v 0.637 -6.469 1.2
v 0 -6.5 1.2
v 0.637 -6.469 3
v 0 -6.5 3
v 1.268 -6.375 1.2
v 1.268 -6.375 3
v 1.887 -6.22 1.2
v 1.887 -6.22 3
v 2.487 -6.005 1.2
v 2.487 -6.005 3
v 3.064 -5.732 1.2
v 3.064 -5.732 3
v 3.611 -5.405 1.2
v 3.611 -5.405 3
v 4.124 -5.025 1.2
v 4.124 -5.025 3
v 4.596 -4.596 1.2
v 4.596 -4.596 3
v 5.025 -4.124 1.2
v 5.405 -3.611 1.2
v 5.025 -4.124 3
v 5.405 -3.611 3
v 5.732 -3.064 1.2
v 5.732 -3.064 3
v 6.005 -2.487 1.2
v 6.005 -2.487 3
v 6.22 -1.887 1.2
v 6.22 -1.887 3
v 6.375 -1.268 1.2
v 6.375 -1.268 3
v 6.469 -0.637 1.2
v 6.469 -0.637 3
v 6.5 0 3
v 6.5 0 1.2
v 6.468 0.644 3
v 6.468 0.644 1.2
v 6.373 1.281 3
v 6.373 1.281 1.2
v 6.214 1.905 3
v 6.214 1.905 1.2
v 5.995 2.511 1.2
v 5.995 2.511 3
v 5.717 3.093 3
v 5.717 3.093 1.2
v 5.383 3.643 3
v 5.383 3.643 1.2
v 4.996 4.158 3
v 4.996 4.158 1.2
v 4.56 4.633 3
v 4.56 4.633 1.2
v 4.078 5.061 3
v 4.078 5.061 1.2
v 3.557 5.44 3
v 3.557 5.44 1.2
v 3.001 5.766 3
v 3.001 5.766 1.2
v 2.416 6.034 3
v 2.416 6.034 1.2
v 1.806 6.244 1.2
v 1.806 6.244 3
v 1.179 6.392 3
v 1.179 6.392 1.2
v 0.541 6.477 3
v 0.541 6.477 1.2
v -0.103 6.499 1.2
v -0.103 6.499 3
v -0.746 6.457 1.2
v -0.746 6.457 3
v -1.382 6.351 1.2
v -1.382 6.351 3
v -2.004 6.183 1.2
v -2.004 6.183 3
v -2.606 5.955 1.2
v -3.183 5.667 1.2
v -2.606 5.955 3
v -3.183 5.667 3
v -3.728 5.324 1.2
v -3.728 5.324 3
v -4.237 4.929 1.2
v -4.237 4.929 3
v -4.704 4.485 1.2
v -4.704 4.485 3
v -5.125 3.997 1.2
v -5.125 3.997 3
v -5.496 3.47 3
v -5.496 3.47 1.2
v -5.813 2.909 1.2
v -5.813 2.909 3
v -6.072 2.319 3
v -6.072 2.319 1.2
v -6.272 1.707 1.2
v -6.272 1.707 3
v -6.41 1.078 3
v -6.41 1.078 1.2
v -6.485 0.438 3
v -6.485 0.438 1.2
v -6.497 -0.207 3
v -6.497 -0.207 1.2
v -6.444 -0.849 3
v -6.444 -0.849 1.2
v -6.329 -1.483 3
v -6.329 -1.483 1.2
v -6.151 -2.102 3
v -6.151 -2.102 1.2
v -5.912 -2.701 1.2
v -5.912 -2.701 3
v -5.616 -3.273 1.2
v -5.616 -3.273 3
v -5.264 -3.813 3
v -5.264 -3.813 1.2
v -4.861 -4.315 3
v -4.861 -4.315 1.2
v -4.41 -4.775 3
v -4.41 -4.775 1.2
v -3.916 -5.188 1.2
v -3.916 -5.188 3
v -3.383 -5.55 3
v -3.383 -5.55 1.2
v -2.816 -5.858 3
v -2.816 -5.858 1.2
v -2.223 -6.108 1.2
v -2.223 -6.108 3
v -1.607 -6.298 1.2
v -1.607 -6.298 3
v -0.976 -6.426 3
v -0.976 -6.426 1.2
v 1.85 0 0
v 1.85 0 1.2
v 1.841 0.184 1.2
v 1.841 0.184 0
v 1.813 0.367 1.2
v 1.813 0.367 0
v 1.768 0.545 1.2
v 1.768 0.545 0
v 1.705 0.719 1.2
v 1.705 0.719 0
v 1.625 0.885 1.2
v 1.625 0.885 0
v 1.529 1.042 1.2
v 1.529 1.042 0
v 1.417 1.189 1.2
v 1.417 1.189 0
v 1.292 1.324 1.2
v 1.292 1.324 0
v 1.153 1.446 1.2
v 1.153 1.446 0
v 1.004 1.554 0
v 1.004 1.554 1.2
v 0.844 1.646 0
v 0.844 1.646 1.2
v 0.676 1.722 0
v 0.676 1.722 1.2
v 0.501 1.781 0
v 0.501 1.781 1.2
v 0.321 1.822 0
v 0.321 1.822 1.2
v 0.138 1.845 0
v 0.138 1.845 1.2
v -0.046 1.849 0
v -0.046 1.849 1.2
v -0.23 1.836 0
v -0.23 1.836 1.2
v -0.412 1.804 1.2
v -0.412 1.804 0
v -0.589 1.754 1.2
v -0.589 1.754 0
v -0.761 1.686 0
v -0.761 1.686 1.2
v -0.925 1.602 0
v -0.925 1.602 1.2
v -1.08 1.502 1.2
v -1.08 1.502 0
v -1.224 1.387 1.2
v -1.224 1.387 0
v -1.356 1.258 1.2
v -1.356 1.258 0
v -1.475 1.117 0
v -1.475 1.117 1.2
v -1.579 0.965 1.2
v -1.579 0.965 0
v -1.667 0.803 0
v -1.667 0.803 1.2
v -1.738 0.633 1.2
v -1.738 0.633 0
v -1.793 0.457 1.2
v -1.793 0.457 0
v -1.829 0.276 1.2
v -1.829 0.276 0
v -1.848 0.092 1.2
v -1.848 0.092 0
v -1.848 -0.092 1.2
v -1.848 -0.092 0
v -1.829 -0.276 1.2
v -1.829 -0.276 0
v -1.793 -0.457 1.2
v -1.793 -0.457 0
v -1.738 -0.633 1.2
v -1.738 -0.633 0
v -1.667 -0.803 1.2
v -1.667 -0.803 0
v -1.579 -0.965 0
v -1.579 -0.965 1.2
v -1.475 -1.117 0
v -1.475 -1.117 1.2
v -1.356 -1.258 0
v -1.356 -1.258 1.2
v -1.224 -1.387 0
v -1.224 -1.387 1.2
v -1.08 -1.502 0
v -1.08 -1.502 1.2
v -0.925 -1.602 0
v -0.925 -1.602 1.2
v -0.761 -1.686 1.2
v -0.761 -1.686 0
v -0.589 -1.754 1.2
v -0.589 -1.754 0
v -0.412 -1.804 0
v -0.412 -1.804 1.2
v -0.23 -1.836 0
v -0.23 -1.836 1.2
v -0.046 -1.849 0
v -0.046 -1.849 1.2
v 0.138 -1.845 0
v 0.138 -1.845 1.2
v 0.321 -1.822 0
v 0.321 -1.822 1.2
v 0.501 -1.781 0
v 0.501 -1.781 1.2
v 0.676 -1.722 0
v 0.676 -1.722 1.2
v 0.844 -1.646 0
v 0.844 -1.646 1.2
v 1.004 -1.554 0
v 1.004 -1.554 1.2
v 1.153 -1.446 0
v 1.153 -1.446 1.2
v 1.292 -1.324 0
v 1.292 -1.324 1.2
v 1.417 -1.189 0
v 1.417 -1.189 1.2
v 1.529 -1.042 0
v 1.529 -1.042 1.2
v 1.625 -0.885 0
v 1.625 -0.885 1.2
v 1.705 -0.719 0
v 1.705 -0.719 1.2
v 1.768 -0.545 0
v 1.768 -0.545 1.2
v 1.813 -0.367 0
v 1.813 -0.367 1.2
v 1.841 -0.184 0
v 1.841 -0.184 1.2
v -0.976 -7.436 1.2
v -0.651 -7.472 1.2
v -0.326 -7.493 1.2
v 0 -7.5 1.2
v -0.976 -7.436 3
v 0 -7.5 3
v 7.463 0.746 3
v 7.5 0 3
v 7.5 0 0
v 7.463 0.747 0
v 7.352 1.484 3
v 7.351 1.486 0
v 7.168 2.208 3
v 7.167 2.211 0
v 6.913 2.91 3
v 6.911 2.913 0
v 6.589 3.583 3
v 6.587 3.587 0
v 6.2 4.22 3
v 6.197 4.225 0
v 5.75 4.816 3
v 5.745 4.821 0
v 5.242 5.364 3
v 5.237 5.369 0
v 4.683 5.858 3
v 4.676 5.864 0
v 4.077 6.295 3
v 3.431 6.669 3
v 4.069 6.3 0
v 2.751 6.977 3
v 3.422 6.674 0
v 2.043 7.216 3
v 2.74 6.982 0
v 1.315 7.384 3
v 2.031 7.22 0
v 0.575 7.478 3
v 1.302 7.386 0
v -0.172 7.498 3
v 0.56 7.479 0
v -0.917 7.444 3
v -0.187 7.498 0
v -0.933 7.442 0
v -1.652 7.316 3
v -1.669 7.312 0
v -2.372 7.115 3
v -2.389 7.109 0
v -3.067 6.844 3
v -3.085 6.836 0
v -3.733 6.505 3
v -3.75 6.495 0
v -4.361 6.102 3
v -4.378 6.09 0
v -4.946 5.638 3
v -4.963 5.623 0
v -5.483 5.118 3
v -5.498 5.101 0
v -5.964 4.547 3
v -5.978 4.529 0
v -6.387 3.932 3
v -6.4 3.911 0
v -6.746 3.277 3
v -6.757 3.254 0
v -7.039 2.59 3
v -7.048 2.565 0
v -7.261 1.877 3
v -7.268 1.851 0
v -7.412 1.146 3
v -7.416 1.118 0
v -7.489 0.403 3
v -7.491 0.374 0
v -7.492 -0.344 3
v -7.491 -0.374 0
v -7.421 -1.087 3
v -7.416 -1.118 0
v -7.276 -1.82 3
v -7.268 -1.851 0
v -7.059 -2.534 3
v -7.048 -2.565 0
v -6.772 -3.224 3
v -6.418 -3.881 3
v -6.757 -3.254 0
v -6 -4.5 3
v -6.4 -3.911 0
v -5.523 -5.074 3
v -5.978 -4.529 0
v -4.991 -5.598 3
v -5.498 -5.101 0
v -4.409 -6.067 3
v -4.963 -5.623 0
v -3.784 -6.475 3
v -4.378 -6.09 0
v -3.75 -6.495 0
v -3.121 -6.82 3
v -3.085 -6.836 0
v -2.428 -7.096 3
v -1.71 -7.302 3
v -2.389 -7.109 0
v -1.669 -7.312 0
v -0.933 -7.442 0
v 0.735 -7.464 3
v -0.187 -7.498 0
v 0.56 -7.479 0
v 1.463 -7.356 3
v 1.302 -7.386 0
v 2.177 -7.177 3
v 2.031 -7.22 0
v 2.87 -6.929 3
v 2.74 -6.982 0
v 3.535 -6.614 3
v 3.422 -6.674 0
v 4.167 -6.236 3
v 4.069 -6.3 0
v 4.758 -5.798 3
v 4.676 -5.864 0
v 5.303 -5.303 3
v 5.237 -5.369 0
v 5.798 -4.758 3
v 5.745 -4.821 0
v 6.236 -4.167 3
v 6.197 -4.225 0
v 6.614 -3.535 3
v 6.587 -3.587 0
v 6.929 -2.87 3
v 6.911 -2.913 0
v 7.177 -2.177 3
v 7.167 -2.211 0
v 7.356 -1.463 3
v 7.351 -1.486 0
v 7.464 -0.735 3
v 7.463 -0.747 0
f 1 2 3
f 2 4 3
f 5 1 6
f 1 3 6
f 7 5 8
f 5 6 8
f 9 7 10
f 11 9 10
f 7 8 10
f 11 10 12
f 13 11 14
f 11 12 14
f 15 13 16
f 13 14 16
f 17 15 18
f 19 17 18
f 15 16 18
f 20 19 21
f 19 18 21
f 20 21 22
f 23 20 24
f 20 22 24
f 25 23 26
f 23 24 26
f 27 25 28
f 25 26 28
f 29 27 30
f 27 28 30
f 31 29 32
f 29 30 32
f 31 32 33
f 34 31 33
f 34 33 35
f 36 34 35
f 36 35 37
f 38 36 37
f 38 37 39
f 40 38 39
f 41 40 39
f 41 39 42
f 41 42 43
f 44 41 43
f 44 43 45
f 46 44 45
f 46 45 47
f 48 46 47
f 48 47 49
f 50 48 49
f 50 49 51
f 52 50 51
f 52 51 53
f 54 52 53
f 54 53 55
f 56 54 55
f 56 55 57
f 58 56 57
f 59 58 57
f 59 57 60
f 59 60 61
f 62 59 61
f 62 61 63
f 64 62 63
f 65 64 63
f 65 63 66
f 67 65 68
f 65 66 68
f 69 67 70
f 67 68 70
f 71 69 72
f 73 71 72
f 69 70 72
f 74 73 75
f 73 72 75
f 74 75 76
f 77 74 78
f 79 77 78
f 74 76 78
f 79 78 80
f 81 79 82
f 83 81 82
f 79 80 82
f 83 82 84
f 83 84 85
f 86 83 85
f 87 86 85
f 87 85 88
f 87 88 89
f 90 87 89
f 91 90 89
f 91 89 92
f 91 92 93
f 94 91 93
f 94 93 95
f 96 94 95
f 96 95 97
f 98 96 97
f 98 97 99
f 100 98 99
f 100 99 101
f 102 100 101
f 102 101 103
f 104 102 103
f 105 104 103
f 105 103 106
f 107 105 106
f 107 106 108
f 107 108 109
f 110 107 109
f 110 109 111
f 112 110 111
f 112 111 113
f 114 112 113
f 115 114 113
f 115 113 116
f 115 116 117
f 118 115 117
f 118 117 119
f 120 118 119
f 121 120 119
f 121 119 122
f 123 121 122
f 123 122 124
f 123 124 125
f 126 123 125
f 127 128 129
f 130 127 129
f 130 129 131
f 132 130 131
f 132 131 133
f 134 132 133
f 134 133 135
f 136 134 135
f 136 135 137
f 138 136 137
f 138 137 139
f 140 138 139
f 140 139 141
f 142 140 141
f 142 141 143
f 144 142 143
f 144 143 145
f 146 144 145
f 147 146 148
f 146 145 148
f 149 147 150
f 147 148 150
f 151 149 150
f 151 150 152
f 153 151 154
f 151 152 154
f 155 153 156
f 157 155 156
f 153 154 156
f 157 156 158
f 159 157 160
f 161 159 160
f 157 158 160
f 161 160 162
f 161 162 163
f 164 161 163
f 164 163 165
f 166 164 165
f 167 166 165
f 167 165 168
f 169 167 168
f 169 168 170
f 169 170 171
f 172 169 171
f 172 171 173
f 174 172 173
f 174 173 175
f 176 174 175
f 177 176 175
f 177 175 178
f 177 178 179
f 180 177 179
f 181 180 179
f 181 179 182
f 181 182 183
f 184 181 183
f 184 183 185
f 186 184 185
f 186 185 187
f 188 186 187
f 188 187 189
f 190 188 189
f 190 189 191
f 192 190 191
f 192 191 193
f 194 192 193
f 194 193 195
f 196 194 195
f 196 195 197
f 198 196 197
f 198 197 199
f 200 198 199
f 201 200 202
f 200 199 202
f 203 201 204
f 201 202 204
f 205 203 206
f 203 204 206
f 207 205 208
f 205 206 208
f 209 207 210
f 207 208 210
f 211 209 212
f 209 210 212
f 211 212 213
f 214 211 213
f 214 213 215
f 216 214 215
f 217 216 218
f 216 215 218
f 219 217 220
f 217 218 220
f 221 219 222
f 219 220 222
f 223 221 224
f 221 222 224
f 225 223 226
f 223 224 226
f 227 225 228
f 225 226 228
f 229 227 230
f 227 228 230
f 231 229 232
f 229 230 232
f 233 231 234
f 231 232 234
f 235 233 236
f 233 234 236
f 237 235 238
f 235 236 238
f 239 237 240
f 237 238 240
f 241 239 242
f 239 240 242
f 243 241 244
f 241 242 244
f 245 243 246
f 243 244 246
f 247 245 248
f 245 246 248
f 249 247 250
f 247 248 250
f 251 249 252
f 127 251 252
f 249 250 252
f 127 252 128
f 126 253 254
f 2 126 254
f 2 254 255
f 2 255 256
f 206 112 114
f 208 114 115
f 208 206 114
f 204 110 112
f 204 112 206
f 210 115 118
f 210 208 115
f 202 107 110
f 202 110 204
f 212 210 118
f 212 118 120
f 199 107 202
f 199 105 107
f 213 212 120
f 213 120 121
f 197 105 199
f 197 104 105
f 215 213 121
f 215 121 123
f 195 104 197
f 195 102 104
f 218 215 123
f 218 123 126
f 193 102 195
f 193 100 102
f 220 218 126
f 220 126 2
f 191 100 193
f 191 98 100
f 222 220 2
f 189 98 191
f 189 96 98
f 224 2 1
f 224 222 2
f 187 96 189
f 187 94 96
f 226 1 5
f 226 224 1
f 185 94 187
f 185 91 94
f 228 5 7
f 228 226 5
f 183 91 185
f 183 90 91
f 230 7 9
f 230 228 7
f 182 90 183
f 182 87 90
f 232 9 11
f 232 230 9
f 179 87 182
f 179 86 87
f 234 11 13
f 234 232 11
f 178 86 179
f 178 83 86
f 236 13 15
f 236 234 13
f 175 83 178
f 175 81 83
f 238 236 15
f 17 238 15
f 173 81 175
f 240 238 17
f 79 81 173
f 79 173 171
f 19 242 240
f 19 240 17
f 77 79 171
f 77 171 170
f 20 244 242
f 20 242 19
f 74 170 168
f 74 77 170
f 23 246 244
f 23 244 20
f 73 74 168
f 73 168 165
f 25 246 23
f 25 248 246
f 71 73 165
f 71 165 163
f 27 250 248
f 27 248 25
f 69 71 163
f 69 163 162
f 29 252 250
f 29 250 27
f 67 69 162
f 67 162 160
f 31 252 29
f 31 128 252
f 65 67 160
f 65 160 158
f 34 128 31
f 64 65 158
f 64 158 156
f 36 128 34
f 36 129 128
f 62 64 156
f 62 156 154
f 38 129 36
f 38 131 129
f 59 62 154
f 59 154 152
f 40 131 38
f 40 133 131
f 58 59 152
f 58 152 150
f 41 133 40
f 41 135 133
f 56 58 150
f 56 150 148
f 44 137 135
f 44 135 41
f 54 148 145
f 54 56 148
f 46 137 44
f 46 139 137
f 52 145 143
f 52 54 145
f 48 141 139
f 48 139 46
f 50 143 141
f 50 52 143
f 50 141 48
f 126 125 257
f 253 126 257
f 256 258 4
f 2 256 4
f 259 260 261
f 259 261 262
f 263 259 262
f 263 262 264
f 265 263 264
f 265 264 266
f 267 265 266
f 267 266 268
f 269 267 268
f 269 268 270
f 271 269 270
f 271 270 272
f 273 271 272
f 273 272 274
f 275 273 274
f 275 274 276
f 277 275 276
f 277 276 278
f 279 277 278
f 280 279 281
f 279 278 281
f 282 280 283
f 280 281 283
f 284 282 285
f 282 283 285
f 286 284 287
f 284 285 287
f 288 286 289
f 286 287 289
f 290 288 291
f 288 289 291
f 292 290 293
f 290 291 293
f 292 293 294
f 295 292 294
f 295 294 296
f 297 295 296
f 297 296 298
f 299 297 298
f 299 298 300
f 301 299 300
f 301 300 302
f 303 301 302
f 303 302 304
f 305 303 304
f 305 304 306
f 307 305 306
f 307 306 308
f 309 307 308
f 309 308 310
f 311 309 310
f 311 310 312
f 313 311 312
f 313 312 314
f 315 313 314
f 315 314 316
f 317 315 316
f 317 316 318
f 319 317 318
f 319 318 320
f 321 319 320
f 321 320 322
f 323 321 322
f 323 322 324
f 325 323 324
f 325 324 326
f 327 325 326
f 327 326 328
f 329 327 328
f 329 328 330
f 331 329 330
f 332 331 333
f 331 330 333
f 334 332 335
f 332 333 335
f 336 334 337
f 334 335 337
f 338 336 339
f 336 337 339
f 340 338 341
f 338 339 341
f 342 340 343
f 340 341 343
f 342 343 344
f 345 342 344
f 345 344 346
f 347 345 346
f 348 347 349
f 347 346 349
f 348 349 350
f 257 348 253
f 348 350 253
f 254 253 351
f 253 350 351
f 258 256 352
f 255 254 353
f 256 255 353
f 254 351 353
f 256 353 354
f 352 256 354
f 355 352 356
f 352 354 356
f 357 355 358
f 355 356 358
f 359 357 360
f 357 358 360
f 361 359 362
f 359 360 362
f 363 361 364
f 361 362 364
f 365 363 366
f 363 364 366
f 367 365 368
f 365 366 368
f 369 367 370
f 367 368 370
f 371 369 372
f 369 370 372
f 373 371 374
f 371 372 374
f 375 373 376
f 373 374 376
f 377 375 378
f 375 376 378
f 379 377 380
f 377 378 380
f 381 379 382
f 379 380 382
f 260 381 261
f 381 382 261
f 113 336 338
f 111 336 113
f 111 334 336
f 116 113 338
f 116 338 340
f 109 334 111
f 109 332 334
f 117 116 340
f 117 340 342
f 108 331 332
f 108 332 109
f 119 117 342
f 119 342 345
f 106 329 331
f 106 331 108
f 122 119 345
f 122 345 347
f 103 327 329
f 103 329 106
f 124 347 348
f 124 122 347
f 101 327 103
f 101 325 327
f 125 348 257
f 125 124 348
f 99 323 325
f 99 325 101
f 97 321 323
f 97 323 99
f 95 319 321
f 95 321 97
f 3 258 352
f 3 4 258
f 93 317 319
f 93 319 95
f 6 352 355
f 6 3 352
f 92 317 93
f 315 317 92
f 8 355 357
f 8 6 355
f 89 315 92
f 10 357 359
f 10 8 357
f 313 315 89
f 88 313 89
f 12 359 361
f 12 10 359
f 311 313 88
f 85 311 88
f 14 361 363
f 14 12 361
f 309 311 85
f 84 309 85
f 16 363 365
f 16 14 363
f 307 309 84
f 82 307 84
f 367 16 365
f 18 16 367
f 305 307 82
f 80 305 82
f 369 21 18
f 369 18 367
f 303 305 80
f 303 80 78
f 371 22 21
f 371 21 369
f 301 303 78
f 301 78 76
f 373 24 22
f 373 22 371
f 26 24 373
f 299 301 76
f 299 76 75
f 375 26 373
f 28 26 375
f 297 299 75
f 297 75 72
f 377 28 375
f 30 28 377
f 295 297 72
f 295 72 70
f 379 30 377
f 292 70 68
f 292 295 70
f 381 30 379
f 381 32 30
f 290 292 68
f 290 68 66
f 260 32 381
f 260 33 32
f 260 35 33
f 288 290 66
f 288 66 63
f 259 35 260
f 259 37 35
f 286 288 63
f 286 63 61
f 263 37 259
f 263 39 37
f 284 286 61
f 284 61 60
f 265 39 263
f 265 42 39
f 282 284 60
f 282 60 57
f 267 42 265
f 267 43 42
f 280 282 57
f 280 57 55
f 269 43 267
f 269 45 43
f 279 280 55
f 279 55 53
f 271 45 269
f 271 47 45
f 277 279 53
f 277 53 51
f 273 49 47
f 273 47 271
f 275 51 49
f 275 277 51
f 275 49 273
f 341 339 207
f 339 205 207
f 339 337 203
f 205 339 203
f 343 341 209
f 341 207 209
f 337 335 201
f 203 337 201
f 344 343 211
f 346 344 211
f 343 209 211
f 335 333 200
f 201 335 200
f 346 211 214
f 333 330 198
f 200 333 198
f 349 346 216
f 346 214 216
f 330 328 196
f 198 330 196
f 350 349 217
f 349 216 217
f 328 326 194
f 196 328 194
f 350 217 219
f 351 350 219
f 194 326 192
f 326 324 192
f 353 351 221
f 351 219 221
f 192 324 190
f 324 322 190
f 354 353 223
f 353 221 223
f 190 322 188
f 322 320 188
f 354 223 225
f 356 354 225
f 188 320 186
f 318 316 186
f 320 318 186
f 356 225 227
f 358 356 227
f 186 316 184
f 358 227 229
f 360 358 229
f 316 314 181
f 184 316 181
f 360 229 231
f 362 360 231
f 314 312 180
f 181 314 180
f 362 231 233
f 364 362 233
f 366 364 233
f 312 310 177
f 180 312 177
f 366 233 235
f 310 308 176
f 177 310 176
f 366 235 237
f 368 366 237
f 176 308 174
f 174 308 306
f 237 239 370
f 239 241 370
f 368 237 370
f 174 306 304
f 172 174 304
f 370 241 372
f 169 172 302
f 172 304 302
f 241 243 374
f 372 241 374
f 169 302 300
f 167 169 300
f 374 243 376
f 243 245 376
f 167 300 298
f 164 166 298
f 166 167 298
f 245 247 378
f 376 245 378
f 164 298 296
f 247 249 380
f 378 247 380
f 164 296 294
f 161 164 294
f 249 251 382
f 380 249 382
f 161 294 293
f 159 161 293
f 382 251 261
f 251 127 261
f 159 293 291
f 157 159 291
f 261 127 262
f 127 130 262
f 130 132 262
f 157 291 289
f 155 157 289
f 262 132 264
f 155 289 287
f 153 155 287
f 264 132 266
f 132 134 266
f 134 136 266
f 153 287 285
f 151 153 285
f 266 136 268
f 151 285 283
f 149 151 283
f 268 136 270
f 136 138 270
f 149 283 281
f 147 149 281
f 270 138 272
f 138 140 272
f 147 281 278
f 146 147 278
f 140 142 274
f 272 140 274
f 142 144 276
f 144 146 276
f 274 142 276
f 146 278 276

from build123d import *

# Parameters (mm, degrees)
F0_R     = 7.5
F1_DEPTH = 3
F2_R     = 6.5000001341
F3_DEPTH = 1.8
F5_DEPTH = 1.8
F6_R     = 1.85
F7_DEPTH = 2


with BuildPart() as f1:
    # F0 (on Top) → F1 (new body)
    with BuildSketch(Plane.XY):
        Circle(F0_R)
    extrude(amount=F1_DEPTH)

    # F2 (on face) → F3 (cut)
    with BuildSketch(Plane.XY.offset(3)):
        Circle(F2_R)
    extrude(amount=-F3_DEPTH, mode=Mode.SUBTRACT)

    # F4 (on face) → F5 (cut)
    with BuildSketch(Plane.XY.offset(3)):
        with BuildLine():
            Line((0, -7.5), (0, -6.5000001341))
            ThreePointArc((0, -6.5000001341), (-0.4891376474, -6.4815697254), (-0.9755014466, -6.4263830162))
            Line((-0.9755014466, -6.4263830162), (-0.9755014466, -7.4362891907))
            ThreePointArc((-0.9755014466, -7.4362891907), (-0.4887898678, -7.4840553489), (0, -7.5))
        make_face()
    extrude(amount=-F5_DEPTH, mode=Mode.SUBTRACT)

    # F6 (on face) → F7 (cut)
    with BuildSketch(Plane.XY.offset(1.2)):
        Circle(F6_R)
    extrude(amount=-F7_DEPTH, mode=Mode.SUBTRACT)


solid = f1.part
